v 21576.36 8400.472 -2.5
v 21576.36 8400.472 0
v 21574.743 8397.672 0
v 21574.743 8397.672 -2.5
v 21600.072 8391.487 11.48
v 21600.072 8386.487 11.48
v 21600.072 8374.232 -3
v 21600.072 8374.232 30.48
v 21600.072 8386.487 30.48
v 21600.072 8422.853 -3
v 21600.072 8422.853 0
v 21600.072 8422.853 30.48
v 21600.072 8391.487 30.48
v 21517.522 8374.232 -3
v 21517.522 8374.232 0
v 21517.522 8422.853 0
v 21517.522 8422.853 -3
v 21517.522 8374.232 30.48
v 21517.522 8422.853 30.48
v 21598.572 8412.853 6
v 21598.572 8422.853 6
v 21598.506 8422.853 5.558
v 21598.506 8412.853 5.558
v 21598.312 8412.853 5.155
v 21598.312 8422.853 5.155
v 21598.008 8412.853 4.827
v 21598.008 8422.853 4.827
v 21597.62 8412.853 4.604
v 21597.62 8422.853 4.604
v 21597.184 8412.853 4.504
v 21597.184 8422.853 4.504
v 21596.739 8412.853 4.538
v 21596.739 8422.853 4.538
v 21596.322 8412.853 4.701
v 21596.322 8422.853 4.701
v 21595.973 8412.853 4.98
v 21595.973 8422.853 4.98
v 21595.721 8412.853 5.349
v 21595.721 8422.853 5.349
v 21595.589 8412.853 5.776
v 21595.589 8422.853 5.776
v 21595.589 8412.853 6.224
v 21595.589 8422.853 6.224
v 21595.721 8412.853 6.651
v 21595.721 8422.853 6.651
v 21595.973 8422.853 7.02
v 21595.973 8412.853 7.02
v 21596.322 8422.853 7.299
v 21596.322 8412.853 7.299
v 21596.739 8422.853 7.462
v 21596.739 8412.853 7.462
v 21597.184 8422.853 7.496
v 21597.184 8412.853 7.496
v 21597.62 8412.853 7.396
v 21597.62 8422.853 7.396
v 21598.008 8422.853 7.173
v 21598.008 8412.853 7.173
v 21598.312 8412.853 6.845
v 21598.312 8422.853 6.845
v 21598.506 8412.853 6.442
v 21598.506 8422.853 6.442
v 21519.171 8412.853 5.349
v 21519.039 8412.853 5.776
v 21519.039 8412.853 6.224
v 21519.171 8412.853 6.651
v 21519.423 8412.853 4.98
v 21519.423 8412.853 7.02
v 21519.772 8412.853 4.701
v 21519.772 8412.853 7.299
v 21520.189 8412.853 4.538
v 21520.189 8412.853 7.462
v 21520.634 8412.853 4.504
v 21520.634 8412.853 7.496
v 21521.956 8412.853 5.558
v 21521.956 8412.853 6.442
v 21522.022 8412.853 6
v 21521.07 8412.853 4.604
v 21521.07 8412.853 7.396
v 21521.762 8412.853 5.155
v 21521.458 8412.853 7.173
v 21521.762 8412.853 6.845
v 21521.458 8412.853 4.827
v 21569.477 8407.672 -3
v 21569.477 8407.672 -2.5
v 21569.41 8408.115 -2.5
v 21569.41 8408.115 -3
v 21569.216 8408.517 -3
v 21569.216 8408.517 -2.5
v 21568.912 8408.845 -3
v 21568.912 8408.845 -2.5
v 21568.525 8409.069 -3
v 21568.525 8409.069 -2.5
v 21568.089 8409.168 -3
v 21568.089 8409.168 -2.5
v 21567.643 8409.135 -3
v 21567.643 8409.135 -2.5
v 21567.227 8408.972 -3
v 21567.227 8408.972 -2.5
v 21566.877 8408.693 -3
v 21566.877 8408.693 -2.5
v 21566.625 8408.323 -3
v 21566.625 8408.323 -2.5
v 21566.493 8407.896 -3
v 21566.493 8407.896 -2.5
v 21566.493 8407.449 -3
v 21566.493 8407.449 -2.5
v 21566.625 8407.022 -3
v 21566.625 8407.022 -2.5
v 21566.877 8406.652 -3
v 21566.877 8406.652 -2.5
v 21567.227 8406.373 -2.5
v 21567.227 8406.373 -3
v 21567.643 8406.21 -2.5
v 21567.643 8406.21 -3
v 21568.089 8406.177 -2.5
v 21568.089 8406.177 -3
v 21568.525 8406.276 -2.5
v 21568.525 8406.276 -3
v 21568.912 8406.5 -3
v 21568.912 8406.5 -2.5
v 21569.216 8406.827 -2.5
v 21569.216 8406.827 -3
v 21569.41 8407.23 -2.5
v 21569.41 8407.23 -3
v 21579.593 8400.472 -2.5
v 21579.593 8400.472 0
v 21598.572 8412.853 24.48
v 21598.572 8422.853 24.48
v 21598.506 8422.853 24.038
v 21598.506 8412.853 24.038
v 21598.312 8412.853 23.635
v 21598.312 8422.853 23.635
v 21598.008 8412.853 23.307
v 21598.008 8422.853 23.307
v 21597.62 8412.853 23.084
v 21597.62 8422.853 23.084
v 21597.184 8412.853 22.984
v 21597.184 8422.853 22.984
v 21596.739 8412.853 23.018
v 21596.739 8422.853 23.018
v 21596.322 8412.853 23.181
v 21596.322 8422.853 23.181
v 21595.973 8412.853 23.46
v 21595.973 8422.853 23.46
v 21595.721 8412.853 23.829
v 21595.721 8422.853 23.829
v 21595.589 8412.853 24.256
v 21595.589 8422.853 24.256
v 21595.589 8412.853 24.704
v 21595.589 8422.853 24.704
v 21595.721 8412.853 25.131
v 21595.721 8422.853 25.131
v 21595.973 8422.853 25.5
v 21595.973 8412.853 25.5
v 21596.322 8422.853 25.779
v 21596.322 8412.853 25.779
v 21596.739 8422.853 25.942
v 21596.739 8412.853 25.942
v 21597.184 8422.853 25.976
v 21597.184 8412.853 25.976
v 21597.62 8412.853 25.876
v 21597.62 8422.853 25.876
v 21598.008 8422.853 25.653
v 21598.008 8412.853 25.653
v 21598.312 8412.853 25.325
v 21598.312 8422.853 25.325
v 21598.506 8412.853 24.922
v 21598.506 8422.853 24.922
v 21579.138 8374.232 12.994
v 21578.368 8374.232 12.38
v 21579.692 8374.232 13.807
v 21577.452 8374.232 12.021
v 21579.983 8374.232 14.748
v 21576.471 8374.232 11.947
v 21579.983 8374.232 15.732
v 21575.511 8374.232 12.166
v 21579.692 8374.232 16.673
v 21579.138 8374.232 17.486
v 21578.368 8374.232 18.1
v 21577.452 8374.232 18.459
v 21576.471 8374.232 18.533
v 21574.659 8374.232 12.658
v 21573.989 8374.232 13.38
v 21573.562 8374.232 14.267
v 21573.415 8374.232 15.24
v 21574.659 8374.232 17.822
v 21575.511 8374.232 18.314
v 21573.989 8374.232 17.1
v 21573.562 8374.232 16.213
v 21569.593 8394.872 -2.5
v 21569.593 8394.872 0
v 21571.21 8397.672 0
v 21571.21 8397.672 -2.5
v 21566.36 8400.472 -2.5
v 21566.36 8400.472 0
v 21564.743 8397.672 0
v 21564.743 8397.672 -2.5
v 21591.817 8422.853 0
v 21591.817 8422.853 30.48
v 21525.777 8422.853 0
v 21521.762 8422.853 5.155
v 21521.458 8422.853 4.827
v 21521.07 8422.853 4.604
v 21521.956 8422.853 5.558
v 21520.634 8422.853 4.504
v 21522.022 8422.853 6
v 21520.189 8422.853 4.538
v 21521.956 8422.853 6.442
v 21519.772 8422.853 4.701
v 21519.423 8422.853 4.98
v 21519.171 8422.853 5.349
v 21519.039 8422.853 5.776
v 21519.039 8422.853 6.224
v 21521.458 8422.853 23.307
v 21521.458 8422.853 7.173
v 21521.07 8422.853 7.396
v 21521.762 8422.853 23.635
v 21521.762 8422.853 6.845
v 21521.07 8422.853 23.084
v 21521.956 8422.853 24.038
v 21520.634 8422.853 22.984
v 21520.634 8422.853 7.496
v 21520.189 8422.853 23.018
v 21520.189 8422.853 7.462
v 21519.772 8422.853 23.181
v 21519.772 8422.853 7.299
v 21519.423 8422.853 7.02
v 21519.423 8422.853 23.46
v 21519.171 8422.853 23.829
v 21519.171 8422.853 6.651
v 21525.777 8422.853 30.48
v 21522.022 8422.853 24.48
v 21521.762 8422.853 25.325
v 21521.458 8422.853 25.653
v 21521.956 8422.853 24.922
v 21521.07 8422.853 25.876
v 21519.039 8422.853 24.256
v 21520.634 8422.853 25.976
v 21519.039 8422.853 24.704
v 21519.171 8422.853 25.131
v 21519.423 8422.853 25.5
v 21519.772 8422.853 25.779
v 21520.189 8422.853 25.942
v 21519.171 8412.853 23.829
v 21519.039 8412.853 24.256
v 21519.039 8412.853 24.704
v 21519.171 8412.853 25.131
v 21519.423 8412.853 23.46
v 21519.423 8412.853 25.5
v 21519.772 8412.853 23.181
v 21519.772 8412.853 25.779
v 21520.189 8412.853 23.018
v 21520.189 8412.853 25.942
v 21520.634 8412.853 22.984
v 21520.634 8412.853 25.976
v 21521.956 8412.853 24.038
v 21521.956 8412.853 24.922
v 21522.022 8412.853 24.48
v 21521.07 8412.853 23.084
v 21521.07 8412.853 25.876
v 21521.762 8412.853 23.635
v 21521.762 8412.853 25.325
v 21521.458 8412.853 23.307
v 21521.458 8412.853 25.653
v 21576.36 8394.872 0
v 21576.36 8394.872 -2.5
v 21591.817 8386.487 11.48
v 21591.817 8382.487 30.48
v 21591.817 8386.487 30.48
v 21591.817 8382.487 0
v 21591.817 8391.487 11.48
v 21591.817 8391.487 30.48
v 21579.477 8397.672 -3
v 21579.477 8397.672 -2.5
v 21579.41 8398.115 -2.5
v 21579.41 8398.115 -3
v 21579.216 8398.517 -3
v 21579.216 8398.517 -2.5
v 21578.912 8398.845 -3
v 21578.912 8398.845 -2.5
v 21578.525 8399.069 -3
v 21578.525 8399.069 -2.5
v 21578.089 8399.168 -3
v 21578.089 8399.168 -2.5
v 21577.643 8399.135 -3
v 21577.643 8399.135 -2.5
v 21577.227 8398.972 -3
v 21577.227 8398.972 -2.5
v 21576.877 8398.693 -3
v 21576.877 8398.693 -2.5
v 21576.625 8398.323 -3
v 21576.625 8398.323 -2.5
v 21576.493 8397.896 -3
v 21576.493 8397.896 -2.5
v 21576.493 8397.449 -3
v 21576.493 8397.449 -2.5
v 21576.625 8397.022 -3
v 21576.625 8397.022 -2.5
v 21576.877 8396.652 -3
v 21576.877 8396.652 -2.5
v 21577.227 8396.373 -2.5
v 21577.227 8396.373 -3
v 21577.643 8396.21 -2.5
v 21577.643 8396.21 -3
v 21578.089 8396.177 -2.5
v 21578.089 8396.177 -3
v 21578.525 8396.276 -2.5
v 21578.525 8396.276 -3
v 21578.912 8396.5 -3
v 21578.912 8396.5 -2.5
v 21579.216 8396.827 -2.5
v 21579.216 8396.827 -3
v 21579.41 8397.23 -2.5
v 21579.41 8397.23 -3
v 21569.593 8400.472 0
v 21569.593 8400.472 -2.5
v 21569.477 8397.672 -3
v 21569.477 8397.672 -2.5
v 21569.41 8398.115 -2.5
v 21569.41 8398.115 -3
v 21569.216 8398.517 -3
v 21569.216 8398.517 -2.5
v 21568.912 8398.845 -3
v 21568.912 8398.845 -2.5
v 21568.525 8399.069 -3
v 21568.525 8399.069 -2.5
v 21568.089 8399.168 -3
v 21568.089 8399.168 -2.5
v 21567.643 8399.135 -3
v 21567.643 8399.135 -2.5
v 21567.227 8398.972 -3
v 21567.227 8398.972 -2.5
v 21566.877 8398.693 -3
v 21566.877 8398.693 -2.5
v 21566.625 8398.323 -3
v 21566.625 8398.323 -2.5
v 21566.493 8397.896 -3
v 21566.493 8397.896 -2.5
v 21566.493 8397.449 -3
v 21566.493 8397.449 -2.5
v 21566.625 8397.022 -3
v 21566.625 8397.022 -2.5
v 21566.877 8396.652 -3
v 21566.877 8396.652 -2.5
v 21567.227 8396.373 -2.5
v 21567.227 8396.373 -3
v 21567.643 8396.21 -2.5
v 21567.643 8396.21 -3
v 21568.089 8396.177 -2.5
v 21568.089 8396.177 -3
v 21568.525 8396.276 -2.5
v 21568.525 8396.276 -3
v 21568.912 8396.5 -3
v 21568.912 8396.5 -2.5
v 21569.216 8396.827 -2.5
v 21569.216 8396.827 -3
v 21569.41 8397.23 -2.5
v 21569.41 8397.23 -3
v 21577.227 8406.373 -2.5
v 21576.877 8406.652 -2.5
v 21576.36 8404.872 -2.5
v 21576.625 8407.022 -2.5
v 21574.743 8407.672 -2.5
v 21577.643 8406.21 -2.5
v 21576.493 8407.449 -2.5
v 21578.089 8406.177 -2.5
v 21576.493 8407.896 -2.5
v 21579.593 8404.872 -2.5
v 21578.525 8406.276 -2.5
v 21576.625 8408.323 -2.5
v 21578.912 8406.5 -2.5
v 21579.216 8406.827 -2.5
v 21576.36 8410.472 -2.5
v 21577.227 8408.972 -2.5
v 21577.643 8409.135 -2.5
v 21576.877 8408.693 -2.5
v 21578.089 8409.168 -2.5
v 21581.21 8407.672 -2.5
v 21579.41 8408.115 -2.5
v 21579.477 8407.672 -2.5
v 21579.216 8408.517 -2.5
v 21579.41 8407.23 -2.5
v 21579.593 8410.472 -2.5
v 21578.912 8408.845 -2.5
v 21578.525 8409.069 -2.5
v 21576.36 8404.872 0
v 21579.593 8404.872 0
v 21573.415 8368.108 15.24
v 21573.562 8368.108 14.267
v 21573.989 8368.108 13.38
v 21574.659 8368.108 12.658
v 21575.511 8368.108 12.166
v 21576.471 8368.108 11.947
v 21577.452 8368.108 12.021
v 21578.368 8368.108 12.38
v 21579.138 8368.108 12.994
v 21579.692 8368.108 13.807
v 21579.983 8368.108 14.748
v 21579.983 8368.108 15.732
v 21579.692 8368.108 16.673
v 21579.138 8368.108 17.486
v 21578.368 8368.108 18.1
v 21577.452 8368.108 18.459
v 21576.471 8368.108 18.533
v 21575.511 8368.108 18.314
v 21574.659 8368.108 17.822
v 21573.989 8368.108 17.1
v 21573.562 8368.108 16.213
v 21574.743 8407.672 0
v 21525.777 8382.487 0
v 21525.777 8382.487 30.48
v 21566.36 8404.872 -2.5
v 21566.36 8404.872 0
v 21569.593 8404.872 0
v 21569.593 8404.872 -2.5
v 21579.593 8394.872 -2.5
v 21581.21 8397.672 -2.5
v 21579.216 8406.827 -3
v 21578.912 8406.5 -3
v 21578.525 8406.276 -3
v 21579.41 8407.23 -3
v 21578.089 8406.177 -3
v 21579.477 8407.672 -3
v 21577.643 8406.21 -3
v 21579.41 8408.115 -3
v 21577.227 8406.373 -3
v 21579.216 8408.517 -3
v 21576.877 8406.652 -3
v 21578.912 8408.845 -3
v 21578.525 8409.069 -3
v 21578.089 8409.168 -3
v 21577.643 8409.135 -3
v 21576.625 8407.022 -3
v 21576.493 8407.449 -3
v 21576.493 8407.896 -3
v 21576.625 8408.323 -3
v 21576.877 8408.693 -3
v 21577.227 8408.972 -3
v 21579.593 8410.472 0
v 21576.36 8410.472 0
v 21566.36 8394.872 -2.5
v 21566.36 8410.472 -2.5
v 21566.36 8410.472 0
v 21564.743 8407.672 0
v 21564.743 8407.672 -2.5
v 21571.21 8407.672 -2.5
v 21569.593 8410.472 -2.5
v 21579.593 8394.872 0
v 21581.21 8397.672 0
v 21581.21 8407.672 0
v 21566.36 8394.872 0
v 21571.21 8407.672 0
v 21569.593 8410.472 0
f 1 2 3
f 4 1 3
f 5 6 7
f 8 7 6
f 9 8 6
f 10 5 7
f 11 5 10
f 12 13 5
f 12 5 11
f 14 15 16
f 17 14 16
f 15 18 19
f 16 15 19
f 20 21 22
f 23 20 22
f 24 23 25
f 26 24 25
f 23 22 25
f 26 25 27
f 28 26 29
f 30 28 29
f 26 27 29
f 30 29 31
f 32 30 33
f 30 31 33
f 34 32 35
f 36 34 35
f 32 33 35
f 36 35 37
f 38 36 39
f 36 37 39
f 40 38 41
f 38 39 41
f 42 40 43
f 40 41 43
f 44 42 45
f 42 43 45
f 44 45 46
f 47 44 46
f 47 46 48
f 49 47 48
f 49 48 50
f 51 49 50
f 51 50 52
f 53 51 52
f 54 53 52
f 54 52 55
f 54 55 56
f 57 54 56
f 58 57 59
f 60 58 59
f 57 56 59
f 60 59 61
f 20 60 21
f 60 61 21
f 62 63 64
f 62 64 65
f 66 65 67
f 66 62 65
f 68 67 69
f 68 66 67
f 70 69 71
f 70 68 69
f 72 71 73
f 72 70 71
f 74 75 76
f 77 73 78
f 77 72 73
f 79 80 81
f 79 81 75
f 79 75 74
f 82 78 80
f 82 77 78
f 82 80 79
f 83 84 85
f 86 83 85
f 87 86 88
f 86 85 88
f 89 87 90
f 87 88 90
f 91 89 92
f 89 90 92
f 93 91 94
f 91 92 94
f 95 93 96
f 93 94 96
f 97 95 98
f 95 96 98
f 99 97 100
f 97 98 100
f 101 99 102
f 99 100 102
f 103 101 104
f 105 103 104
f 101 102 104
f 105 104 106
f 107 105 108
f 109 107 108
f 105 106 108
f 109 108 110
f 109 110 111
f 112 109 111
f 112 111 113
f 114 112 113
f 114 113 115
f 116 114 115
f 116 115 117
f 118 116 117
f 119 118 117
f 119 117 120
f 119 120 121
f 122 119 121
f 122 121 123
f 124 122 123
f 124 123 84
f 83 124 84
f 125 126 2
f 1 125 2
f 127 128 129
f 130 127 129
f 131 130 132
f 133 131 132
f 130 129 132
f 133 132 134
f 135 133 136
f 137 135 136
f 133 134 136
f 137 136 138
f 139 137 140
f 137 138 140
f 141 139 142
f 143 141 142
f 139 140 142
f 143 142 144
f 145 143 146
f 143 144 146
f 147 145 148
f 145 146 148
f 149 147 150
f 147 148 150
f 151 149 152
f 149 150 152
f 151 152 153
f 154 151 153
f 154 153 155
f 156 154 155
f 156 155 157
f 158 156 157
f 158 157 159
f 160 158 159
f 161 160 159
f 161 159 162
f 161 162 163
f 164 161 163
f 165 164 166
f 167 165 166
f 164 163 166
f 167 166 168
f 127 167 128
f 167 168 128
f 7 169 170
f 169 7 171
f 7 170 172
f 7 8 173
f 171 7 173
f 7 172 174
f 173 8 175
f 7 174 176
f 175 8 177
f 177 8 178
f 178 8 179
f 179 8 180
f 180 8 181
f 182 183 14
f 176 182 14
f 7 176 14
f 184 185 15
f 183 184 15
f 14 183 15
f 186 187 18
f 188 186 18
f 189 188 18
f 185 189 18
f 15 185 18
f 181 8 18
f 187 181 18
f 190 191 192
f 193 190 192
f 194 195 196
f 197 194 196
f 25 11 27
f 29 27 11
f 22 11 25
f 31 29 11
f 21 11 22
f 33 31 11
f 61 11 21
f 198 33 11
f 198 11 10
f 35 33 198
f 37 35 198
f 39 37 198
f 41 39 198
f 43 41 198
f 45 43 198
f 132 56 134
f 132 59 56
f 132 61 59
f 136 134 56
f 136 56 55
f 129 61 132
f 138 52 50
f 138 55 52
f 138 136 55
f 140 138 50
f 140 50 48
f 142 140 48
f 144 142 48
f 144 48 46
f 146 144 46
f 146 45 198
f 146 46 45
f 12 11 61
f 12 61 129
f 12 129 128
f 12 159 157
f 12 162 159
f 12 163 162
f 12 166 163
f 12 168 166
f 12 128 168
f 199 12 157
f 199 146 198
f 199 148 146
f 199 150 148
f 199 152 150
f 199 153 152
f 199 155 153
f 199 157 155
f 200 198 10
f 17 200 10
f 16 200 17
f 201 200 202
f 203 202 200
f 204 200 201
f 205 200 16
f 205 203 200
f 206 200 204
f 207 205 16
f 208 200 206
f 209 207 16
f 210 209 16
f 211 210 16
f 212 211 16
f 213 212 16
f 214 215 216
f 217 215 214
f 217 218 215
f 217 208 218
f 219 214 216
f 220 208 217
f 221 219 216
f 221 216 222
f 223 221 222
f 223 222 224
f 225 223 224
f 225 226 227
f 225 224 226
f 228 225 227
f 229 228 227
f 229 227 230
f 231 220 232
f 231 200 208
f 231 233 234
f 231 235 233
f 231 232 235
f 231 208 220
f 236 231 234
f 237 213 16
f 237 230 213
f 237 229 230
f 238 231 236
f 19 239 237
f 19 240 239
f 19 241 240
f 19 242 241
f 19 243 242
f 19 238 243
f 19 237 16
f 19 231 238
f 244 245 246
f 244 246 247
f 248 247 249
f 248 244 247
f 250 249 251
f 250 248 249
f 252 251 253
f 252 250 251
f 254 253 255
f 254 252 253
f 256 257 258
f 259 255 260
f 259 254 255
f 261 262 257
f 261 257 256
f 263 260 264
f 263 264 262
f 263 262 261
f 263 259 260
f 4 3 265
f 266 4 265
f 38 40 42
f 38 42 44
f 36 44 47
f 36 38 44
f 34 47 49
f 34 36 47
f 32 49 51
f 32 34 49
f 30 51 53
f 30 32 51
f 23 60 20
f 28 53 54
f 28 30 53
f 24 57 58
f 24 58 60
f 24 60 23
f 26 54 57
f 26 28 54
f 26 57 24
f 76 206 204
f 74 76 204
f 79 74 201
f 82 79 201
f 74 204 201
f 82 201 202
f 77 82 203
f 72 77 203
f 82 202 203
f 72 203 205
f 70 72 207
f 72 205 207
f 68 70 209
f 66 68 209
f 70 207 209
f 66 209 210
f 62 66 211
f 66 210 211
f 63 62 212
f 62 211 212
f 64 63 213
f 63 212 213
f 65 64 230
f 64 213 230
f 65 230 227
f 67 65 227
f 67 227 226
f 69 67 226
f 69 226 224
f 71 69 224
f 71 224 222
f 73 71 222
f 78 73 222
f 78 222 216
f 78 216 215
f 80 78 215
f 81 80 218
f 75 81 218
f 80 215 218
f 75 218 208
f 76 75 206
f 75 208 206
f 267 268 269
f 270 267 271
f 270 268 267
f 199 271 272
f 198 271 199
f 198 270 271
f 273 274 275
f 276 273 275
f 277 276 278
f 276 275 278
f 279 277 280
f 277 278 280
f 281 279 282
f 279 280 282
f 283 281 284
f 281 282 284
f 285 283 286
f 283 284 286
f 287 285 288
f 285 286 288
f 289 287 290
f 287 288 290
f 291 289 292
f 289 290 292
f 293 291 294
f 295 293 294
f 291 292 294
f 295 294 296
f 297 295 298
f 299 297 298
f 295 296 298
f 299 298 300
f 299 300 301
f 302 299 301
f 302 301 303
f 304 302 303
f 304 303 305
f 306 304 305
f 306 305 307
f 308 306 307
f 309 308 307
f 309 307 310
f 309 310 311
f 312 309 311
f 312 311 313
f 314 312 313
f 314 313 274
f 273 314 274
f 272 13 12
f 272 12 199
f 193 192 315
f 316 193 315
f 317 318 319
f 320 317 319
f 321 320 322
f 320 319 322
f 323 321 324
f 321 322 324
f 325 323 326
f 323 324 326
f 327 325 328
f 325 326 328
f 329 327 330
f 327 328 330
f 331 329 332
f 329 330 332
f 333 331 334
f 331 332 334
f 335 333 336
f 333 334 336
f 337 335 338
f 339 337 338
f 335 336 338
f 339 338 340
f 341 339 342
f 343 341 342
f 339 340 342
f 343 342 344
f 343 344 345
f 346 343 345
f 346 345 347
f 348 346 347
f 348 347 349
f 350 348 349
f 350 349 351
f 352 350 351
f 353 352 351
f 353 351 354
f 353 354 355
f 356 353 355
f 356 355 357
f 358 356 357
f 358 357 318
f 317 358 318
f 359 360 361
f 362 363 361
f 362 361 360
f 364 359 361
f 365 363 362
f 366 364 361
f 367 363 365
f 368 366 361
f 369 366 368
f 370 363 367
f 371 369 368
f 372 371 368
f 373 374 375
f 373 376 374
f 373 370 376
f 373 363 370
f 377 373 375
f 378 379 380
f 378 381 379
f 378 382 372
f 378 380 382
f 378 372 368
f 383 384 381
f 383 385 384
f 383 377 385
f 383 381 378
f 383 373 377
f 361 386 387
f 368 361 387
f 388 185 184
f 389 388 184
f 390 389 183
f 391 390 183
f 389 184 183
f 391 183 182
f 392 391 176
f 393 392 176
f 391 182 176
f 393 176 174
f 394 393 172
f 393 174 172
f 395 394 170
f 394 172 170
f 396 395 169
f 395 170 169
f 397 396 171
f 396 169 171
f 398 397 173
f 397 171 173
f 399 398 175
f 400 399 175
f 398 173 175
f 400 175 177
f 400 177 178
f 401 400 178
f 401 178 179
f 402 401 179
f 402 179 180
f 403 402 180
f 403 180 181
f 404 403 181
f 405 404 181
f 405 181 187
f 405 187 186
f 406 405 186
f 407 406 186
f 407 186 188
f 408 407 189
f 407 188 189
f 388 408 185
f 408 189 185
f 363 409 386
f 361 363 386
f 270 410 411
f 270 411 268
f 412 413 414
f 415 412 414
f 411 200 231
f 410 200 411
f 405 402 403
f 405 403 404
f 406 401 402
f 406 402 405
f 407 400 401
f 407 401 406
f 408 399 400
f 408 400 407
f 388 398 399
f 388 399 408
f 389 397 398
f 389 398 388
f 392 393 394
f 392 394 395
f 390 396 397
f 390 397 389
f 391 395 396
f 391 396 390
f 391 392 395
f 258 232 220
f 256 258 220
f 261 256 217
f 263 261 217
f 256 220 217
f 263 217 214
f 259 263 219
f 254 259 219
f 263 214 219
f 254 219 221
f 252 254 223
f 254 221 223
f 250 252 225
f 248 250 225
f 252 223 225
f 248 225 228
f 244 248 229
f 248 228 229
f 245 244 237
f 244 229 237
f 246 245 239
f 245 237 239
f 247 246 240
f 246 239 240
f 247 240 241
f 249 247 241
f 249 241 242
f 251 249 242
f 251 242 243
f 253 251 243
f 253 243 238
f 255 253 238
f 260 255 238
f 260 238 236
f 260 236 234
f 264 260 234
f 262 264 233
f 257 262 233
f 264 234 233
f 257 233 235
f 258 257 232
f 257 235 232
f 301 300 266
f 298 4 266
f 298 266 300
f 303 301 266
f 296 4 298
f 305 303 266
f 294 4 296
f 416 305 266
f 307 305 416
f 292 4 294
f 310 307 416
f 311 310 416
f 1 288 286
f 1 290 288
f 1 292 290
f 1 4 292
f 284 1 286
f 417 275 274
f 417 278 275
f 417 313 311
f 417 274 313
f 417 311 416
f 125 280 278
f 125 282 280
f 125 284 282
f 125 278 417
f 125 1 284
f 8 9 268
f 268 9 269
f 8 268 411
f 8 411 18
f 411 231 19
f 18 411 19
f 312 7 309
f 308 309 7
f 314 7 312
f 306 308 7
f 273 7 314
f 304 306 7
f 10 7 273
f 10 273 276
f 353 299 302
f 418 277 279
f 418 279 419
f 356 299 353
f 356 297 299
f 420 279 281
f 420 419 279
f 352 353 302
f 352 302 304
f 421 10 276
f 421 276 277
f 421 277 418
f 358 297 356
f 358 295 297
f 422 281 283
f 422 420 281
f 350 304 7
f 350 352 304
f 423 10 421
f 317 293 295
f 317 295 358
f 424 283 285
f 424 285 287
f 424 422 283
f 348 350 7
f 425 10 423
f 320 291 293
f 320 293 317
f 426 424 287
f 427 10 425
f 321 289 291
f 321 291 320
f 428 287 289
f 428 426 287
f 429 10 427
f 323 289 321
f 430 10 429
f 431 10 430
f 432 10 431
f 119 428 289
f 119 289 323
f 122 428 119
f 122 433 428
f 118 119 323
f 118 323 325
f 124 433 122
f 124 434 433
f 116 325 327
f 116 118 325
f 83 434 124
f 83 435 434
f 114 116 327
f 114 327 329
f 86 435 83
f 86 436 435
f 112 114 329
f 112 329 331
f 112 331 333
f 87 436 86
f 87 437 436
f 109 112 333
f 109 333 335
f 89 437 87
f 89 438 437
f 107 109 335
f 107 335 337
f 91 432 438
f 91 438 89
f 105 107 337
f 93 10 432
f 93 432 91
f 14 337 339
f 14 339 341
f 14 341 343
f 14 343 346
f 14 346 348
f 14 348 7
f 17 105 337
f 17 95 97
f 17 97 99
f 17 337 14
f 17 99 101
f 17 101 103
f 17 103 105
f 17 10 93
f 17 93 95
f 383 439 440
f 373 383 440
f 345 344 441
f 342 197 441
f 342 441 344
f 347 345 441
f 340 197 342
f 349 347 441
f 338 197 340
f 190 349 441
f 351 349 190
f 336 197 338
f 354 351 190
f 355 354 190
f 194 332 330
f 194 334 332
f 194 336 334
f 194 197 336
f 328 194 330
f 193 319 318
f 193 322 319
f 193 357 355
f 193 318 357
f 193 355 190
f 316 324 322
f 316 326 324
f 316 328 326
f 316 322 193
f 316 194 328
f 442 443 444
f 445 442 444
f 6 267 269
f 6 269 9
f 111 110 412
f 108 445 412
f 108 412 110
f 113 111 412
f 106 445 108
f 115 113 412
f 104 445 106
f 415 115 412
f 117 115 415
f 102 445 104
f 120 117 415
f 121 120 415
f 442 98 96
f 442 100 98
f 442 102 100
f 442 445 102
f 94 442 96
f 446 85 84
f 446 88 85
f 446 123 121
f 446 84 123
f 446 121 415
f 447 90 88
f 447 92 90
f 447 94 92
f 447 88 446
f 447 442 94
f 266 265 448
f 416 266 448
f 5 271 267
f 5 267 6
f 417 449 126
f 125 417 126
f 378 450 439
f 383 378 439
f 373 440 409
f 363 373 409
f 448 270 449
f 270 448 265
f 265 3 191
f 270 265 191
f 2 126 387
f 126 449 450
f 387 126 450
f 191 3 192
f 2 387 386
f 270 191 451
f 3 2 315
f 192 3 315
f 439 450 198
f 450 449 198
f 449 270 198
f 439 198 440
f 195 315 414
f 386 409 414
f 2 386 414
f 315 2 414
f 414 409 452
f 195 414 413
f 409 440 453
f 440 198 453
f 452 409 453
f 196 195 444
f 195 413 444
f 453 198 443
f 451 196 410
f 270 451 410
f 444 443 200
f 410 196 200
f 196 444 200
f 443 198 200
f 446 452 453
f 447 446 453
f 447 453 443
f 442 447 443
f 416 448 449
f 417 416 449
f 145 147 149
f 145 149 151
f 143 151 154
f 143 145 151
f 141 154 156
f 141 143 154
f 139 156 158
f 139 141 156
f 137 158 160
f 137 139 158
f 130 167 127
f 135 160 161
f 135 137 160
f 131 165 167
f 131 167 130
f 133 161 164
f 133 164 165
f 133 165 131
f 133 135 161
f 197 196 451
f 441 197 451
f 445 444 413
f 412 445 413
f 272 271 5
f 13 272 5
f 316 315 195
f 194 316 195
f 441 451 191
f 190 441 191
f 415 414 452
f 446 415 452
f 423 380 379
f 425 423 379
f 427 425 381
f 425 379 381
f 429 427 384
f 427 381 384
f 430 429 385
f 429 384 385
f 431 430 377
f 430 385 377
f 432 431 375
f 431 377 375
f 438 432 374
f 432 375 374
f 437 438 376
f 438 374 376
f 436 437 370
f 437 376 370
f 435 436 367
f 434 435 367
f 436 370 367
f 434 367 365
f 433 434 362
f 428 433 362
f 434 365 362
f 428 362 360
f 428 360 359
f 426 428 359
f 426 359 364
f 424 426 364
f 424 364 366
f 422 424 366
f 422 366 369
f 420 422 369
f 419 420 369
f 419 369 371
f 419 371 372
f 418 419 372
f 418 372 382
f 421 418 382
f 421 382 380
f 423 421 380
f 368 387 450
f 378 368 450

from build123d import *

# Parameters (mm, degrees)
EXTRUDE_1_DEPTH     = 30.48
SKETCH_4_R          = 3.302
EXTRUDE_2_DEPTH     = 6.12463
SKETCH_5_W          = 82.55
SKETCH_5_H          = 48.620400001
EXTRUDE_3_DEPTH     = 3
SKETCH_6_R          = 1.5
CUT_EXTRUDE_1_DEPTH = 3
SKETCH_7_R          = 1.5
CUT_EXTRUDE_2_DEPTH = 2.5
SKETCH_8_R          = 1.5
CUT_EXTRUDE_3_DEPTH = 10
SKETCH_9_W          = 8.255
SKETCH_9_H          = 5
CUT_EXTRUDE_4_DEPTH = 19


with BuildPart() as part:
    # 스케치3 → 보스-돌출1 (new body)
    with BuildSketch(Plane.XY):
        Polygon((21517.522317655, 8422.852866974), (21525.777317655, 8422.852866974), (21525.777317655, 8382.487466973), (21591.817317655, 8382.487466973), (21591.817317655, 8422.852866974), (21600.072317655, 8422.852866974), (21600.072317655, 8374.232466973), (21517.522317655, 8374.232466973), align=None)
    extrude(amount=EXTRUDE_1_DEPTH)

    # 스케치4 → 보스-돌출2 (add)
    with BuildSketch(Plane(origin=(0, 8374.232466973, 0), x_dir=(-1, 0, 0), z_dir=(0, -1, 0))):
        with Locations((-21576.717457655, -15.24)):
            Circle(SKETCH_4_R)
    extrude(amount=EXTRUDE_2_DEPTH)

    # 스케치5 → 보스-돌출3 (add)
    with BuildSketch(Plane(origin=(0, 0, 0), x_dir=(-1, 0, 0), z_dir=(0, 0, -1))):
        with Locations((-21558.797317655, 8398.542666974)):
            Rectangle(SKETCH_5_W, SKETCH_5_H)
    extrude(amount=EXTRUDE_3_DEPTH)

    # 스케치6 → 컷-돌출1 (cut)
    with BuildSketch(Plane.XY):
        with Locations((21577.97657564, 8407.672466973)):
            Circle(SKETCH_6_R)
        with Locations((21567.97657564, 8407.672466973)):
            Circle(SKETCH_6_R)
        with Locations((21567.97657564, 8397.672466973)):
            Circle(SKETCH_6_R)
        with Locations((21577.97657564, 8397.672466973)):
            Circle(SKETCH_6_R)
    extrude(amount=-CUT_EXTRUDE_1_DEPTH, mode=Mode.SUBTRACT)

    # 스케치7 → 컷-돌출2 (cut)
    with BuildSketch(Plane.XY):
        Polygon((21569.593155483, 8410.472467064), (21566.359995798, 8410.472467064), (21564.743415955, 8407.672466973), (21566.359995798, 8404.872466883), (21569.593155483, 8404.872466883), (21571.209735325, 8407.672466973), align=None)
        with Locations((21567.97657564, 8407.672466973)):
            Circle(SKETCH_7_R, mode=Mode.SUBTRACT)
        Polygon((21569.593155483, 8400.472467064), (21566.359995798, 8400.472467064), (21564.743415955, 8397.672466973), (21566.359995798, 8394.872466883), (21569.593155483, 8394.872466883), (21571.209735325, 8397.672466973), align=None)
        with Locations((21567.97657564, 8397.672466973)):
            Circle(SKETCH_7_R, mode=Mode.SUBTRACT)
        Polygon((21579.593155483, 8400.472467064), (21576.359995798, 8400.472467064), (21574.743415955, 8397.672466973), (21576.359995798, 8394.872466883), (21579.593155483, 8394.872466883), (21581.209735325, 8397.672466973), align=None)
        with Locations((21577.97657564, 8397.672466973)):
            Circle(SKETCH_7_R, mode=Mode.SUBTRACT)
        Polygon((21579.593155483, 8410.472467064), (21576.359995798, 8410.472467064), (21574.743415955, 8407.672466973), (21576.359995798, 8404.872466883), (21579.593155483, 8404.872466883), (21581.209735325, 8407.672466973), align=None)
        with Locations((21577.97657564, 8407.672466973)):
            Circle(SKETCH_7_R, mode=Mode.SUBTRACT)
    extrude(amount=-CUT_EXTRUDE_2_DEPTH, mode=Mode.SUBTRACT)

    # 스케치8 → 컷-돌출3 (cut)
    with BuildSketch(Plane(origin=(0, 8422.852866974, 0), x_dir=(1, 0, 0), z_dir=(0, 1, 0))):
        with Locations((21597.072317655, -6)):
            Circle(SKETCH_8_R)
        with Locations((21597.072317655, -24.48)):
            Circle(SKETCH_8_R)
        with Locations((21520.522317655, -24.48)):
            Circle(SKETCH_8_R)
        with Locations((21520.522317655, -6)):
            Circle(SKETCH_8_R)
    extrude(amount=-CUT_EXTRUDE_3_DEPTH, mode=Mode.SUBTRACT)

    # 스케치9 → 컷-돌출4 (cut)
    with BuildSketch(Plane.XY.offset(30.48)):
        with Locations((21595.944817655, 8388.987466973)):
            Rectangle(SKETCH_9_W, SKETCH_9_H)
    extrude(amount=-CUT_EXTRUDE_4_DEPTH, mode=Mode.SUBTRACT)


solid = part.part
